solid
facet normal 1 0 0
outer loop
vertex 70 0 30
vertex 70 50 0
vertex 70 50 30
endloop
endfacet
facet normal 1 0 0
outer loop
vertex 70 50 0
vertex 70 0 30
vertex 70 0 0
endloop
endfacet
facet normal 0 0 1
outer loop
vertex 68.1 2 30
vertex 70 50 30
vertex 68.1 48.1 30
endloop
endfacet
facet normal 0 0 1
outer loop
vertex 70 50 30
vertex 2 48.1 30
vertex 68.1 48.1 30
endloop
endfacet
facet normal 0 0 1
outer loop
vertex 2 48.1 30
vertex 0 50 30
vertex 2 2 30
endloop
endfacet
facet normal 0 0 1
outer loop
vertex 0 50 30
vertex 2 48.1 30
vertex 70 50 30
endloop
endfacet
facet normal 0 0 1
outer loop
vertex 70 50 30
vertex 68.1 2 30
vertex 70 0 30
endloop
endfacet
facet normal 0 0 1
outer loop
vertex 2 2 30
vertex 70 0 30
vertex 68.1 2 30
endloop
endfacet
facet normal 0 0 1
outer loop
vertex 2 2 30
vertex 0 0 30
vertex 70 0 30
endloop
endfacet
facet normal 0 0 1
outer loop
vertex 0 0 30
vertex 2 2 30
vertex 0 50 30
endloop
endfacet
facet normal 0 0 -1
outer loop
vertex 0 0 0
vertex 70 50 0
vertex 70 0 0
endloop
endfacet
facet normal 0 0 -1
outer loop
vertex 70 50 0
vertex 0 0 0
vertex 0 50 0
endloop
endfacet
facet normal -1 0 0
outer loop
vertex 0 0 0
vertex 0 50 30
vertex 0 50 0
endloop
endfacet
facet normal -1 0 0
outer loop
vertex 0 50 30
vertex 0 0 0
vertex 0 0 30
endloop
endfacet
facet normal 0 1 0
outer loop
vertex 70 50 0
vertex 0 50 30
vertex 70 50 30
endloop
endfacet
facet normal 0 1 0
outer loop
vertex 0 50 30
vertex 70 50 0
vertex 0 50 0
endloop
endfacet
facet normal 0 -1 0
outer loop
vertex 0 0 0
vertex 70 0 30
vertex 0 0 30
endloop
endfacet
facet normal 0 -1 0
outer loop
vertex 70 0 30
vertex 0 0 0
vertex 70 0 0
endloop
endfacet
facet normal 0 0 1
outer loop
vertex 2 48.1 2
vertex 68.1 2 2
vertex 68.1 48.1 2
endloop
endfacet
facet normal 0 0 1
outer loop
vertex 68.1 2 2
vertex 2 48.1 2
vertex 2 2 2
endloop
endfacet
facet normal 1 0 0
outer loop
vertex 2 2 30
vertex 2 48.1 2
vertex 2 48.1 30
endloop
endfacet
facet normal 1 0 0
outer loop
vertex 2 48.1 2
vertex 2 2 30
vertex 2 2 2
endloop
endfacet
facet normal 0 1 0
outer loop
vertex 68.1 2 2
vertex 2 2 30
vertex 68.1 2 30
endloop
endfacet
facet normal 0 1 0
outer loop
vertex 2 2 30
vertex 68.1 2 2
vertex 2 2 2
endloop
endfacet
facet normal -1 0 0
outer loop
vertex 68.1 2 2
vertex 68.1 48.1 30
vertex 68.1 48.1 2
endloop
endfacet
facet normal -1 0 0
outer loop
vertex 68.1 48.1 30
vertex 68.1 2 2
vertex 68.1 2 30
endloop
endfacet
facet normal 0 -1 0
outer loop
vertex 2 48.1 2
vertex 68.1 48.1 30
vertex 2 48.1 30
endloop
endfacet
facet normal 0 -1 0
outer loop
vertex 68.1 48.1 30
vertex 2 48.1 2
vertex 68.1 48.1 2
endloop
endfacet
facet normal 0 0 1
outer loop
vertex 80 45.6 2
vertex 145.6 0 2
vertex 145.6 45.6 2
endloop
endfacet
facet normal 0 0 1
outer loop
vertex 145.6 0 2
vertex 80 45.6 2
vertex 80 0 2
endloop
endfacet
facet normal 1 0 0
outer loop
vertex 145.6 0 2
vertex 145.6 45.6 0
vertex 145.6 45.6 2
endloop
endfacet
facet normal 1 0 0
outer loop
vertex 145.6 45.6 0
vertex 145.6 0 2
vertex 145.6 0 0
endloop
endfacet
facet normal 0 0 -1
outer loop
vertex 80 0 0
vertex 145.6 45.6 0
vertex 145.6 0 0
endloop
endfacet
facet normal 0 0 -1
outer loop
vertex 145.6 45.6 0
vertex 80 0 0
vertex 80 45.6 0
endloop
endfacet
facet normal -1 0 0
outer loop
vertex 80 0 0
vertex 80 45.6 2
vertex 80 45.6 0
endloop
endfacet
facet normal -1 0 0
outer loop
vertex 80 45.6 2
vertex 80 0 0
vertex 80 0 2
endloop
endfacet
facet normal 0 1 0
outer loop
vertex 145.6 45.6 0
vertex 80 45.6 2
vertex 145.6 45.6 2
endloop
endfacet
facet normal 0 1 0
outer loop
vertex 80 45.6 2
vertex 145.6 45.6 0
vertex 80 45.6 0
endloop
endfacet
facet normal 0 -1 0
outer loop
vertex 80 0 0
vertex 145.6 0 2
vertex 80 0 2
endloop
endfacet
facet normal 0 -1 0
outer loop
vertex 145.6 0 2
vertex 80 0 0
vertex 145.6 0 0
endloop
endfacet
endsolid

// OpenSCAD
// Two-part enclosure for small electronics board
// Part 1: Box (left)
// Part 2: Lid (right, printed upside down relative to assembly, but on bed)
// Prints together with a 10 mm gap.

// --- Dimensions ---
// Box Outer Dimensions (X x Y x Z)
$box_outer_x = 70;
$box_outer_y = 50;
$box_outer_z = 30;

// Wall and Floor Thickness
$wall_thickness = 2;
$floor_thickness = 2;

// Lid Dimensions
// Plate thickness
$plate_thickness = 2;
// Lip dimensions (height and wall thickness)
$lip_height = 4;
$lip_wall_thickness = 1.5;
// Lip outer size (X x Y)
$lip_outer_x = 65.6;
$lip_outer_y = 45.6;

// Clearance
$clearance = 0.2;

// Gap between parts
$gap = 10;

// --- Configuration ---
// Set global resolution for curved shapes
$fn = 64;

// --- Part 1: The Box ---
// Position: Bottom-left-front corner at (0,0,0)
// Dimensions: $box_outer_x by $box_outer_y by $box_outer_z
translate([0, 0, 0]) {
    difference() {
        // Main outer block
        cube([
            $box_outer_x, 
            $box_outer_y, 
            $box_outer_z
        ]);
        
        // Cut out the interior (open top)
        translate([
            $wall_thickness, 
            $wall_thickness, 
            $floor_thickness
        ]) {
            cube([
                $box_outer_x - (2 * $wall_thickness),
                $box_outer_y - (2 * $wall_thickness),
                $box_outer_z - $floor_thickness
            ]);
        }
        
        // Extend cut slightly to ensure clean separation
        translate([
            $wall_thickness, 
            $wall_thickness, 
            $floor_thickness
        ]) {
            cube([
                $box_outer_x - (2 * $wall_thickness) + 0.1,
                $box_outer_y - (2 * $wall_thickness) + 0.1,
                $box_outer_z - $floor_thickness + 0.1
            ]);
        }
    }
}

// --- Part 2: The Lid ---
// Position: Starts after the gap.
// Box ends at X = 70. Gap is 10. Lid starts at X = 80.
// Lid Center X = 80 + ($lip_outer_x / 2)
$lid_start_x = $box_outer_x + $gap;
$lid_center_x = $lid_start_x + ($lip_outer_x / 2);

// The lid is a plate with a lip.
// It rests on the bed (z=0).
translate([
    $lid_center_x - ($lip_outer_x / 2), 
    0, 
    0
]) {
    difference() {
        // 1. The main plate (70x50x2)
        cube([
            $lip_outer_x, 
            $lip_outer_y, 
            $plate_thickness
        ]);
        
        // 2. The Lip (raised wall)
        // The lip sits on top of the plate.
        // Lip outer size: 65.6 x 45.6
        // Lip wall thickness: 1.5
        // Lip height: 4
        
        // Step 2a: Cut the hole for the lip in the plate
        $lip_inner_x = $lip_outer_x - (2 * $lip_wall_thickness);
        $lip_inner_y = $lip_outer_y - (2 * $lip_wall_thickness);
        
        translate([
            0, 
            0, 
            $plate_thickness
        ]) {
            // Cut the hole through the plate
            cube([
                $lip_inner_x, 
                $lip_inner_y, 
                $plate_thickness + 1 // Extend past bottom to ensure clean cut
            ]);
        }
        
        // Step 2b: Add the Lip Wall
        // The lip is a hollow box sitting on the plate.
        // Outer: 65.6 x 45.6 x 4
        // Inner: 65.6 - 3 = 62.6 x 45.6 - 3 = 42.6 x 4 (height)
        // Floor of lip: 1.5 thick
        
        translate([
            0, 
            0, 
            $plate_thickness
        ]) {
            // Solid block for the lip outer dimensions
            cube([
                $lip_outer_x, 
                $lip_outer_y, 
                $lip_height
            ]);
            
            // Cut out the inner void of the lip
            translate([
                $lip_wall_thickness, 
                $lip_wall_thickness, 
                $lip_wall_thickness
            ]) {
                cube([
                    $lip_inner_x, 
                    $lip_inner_y, 
                    $lip_height - $lip_wall_thickness
                ]);
            }
            
            // Extend cut slightly to ensure clean separation from plate
            translate([
                $lip_wall_thickness, 
                $lip_wall_thickness, 
                $lip_wall_thickness
            ]) {
                cube([
                    $lip_inner_x + 0.1, 
                    $lip_inner_y + 0.1, 
                    $lip_height - $lip_wall_thickness + 0.1
                ]);
            }
        }
    }
}
